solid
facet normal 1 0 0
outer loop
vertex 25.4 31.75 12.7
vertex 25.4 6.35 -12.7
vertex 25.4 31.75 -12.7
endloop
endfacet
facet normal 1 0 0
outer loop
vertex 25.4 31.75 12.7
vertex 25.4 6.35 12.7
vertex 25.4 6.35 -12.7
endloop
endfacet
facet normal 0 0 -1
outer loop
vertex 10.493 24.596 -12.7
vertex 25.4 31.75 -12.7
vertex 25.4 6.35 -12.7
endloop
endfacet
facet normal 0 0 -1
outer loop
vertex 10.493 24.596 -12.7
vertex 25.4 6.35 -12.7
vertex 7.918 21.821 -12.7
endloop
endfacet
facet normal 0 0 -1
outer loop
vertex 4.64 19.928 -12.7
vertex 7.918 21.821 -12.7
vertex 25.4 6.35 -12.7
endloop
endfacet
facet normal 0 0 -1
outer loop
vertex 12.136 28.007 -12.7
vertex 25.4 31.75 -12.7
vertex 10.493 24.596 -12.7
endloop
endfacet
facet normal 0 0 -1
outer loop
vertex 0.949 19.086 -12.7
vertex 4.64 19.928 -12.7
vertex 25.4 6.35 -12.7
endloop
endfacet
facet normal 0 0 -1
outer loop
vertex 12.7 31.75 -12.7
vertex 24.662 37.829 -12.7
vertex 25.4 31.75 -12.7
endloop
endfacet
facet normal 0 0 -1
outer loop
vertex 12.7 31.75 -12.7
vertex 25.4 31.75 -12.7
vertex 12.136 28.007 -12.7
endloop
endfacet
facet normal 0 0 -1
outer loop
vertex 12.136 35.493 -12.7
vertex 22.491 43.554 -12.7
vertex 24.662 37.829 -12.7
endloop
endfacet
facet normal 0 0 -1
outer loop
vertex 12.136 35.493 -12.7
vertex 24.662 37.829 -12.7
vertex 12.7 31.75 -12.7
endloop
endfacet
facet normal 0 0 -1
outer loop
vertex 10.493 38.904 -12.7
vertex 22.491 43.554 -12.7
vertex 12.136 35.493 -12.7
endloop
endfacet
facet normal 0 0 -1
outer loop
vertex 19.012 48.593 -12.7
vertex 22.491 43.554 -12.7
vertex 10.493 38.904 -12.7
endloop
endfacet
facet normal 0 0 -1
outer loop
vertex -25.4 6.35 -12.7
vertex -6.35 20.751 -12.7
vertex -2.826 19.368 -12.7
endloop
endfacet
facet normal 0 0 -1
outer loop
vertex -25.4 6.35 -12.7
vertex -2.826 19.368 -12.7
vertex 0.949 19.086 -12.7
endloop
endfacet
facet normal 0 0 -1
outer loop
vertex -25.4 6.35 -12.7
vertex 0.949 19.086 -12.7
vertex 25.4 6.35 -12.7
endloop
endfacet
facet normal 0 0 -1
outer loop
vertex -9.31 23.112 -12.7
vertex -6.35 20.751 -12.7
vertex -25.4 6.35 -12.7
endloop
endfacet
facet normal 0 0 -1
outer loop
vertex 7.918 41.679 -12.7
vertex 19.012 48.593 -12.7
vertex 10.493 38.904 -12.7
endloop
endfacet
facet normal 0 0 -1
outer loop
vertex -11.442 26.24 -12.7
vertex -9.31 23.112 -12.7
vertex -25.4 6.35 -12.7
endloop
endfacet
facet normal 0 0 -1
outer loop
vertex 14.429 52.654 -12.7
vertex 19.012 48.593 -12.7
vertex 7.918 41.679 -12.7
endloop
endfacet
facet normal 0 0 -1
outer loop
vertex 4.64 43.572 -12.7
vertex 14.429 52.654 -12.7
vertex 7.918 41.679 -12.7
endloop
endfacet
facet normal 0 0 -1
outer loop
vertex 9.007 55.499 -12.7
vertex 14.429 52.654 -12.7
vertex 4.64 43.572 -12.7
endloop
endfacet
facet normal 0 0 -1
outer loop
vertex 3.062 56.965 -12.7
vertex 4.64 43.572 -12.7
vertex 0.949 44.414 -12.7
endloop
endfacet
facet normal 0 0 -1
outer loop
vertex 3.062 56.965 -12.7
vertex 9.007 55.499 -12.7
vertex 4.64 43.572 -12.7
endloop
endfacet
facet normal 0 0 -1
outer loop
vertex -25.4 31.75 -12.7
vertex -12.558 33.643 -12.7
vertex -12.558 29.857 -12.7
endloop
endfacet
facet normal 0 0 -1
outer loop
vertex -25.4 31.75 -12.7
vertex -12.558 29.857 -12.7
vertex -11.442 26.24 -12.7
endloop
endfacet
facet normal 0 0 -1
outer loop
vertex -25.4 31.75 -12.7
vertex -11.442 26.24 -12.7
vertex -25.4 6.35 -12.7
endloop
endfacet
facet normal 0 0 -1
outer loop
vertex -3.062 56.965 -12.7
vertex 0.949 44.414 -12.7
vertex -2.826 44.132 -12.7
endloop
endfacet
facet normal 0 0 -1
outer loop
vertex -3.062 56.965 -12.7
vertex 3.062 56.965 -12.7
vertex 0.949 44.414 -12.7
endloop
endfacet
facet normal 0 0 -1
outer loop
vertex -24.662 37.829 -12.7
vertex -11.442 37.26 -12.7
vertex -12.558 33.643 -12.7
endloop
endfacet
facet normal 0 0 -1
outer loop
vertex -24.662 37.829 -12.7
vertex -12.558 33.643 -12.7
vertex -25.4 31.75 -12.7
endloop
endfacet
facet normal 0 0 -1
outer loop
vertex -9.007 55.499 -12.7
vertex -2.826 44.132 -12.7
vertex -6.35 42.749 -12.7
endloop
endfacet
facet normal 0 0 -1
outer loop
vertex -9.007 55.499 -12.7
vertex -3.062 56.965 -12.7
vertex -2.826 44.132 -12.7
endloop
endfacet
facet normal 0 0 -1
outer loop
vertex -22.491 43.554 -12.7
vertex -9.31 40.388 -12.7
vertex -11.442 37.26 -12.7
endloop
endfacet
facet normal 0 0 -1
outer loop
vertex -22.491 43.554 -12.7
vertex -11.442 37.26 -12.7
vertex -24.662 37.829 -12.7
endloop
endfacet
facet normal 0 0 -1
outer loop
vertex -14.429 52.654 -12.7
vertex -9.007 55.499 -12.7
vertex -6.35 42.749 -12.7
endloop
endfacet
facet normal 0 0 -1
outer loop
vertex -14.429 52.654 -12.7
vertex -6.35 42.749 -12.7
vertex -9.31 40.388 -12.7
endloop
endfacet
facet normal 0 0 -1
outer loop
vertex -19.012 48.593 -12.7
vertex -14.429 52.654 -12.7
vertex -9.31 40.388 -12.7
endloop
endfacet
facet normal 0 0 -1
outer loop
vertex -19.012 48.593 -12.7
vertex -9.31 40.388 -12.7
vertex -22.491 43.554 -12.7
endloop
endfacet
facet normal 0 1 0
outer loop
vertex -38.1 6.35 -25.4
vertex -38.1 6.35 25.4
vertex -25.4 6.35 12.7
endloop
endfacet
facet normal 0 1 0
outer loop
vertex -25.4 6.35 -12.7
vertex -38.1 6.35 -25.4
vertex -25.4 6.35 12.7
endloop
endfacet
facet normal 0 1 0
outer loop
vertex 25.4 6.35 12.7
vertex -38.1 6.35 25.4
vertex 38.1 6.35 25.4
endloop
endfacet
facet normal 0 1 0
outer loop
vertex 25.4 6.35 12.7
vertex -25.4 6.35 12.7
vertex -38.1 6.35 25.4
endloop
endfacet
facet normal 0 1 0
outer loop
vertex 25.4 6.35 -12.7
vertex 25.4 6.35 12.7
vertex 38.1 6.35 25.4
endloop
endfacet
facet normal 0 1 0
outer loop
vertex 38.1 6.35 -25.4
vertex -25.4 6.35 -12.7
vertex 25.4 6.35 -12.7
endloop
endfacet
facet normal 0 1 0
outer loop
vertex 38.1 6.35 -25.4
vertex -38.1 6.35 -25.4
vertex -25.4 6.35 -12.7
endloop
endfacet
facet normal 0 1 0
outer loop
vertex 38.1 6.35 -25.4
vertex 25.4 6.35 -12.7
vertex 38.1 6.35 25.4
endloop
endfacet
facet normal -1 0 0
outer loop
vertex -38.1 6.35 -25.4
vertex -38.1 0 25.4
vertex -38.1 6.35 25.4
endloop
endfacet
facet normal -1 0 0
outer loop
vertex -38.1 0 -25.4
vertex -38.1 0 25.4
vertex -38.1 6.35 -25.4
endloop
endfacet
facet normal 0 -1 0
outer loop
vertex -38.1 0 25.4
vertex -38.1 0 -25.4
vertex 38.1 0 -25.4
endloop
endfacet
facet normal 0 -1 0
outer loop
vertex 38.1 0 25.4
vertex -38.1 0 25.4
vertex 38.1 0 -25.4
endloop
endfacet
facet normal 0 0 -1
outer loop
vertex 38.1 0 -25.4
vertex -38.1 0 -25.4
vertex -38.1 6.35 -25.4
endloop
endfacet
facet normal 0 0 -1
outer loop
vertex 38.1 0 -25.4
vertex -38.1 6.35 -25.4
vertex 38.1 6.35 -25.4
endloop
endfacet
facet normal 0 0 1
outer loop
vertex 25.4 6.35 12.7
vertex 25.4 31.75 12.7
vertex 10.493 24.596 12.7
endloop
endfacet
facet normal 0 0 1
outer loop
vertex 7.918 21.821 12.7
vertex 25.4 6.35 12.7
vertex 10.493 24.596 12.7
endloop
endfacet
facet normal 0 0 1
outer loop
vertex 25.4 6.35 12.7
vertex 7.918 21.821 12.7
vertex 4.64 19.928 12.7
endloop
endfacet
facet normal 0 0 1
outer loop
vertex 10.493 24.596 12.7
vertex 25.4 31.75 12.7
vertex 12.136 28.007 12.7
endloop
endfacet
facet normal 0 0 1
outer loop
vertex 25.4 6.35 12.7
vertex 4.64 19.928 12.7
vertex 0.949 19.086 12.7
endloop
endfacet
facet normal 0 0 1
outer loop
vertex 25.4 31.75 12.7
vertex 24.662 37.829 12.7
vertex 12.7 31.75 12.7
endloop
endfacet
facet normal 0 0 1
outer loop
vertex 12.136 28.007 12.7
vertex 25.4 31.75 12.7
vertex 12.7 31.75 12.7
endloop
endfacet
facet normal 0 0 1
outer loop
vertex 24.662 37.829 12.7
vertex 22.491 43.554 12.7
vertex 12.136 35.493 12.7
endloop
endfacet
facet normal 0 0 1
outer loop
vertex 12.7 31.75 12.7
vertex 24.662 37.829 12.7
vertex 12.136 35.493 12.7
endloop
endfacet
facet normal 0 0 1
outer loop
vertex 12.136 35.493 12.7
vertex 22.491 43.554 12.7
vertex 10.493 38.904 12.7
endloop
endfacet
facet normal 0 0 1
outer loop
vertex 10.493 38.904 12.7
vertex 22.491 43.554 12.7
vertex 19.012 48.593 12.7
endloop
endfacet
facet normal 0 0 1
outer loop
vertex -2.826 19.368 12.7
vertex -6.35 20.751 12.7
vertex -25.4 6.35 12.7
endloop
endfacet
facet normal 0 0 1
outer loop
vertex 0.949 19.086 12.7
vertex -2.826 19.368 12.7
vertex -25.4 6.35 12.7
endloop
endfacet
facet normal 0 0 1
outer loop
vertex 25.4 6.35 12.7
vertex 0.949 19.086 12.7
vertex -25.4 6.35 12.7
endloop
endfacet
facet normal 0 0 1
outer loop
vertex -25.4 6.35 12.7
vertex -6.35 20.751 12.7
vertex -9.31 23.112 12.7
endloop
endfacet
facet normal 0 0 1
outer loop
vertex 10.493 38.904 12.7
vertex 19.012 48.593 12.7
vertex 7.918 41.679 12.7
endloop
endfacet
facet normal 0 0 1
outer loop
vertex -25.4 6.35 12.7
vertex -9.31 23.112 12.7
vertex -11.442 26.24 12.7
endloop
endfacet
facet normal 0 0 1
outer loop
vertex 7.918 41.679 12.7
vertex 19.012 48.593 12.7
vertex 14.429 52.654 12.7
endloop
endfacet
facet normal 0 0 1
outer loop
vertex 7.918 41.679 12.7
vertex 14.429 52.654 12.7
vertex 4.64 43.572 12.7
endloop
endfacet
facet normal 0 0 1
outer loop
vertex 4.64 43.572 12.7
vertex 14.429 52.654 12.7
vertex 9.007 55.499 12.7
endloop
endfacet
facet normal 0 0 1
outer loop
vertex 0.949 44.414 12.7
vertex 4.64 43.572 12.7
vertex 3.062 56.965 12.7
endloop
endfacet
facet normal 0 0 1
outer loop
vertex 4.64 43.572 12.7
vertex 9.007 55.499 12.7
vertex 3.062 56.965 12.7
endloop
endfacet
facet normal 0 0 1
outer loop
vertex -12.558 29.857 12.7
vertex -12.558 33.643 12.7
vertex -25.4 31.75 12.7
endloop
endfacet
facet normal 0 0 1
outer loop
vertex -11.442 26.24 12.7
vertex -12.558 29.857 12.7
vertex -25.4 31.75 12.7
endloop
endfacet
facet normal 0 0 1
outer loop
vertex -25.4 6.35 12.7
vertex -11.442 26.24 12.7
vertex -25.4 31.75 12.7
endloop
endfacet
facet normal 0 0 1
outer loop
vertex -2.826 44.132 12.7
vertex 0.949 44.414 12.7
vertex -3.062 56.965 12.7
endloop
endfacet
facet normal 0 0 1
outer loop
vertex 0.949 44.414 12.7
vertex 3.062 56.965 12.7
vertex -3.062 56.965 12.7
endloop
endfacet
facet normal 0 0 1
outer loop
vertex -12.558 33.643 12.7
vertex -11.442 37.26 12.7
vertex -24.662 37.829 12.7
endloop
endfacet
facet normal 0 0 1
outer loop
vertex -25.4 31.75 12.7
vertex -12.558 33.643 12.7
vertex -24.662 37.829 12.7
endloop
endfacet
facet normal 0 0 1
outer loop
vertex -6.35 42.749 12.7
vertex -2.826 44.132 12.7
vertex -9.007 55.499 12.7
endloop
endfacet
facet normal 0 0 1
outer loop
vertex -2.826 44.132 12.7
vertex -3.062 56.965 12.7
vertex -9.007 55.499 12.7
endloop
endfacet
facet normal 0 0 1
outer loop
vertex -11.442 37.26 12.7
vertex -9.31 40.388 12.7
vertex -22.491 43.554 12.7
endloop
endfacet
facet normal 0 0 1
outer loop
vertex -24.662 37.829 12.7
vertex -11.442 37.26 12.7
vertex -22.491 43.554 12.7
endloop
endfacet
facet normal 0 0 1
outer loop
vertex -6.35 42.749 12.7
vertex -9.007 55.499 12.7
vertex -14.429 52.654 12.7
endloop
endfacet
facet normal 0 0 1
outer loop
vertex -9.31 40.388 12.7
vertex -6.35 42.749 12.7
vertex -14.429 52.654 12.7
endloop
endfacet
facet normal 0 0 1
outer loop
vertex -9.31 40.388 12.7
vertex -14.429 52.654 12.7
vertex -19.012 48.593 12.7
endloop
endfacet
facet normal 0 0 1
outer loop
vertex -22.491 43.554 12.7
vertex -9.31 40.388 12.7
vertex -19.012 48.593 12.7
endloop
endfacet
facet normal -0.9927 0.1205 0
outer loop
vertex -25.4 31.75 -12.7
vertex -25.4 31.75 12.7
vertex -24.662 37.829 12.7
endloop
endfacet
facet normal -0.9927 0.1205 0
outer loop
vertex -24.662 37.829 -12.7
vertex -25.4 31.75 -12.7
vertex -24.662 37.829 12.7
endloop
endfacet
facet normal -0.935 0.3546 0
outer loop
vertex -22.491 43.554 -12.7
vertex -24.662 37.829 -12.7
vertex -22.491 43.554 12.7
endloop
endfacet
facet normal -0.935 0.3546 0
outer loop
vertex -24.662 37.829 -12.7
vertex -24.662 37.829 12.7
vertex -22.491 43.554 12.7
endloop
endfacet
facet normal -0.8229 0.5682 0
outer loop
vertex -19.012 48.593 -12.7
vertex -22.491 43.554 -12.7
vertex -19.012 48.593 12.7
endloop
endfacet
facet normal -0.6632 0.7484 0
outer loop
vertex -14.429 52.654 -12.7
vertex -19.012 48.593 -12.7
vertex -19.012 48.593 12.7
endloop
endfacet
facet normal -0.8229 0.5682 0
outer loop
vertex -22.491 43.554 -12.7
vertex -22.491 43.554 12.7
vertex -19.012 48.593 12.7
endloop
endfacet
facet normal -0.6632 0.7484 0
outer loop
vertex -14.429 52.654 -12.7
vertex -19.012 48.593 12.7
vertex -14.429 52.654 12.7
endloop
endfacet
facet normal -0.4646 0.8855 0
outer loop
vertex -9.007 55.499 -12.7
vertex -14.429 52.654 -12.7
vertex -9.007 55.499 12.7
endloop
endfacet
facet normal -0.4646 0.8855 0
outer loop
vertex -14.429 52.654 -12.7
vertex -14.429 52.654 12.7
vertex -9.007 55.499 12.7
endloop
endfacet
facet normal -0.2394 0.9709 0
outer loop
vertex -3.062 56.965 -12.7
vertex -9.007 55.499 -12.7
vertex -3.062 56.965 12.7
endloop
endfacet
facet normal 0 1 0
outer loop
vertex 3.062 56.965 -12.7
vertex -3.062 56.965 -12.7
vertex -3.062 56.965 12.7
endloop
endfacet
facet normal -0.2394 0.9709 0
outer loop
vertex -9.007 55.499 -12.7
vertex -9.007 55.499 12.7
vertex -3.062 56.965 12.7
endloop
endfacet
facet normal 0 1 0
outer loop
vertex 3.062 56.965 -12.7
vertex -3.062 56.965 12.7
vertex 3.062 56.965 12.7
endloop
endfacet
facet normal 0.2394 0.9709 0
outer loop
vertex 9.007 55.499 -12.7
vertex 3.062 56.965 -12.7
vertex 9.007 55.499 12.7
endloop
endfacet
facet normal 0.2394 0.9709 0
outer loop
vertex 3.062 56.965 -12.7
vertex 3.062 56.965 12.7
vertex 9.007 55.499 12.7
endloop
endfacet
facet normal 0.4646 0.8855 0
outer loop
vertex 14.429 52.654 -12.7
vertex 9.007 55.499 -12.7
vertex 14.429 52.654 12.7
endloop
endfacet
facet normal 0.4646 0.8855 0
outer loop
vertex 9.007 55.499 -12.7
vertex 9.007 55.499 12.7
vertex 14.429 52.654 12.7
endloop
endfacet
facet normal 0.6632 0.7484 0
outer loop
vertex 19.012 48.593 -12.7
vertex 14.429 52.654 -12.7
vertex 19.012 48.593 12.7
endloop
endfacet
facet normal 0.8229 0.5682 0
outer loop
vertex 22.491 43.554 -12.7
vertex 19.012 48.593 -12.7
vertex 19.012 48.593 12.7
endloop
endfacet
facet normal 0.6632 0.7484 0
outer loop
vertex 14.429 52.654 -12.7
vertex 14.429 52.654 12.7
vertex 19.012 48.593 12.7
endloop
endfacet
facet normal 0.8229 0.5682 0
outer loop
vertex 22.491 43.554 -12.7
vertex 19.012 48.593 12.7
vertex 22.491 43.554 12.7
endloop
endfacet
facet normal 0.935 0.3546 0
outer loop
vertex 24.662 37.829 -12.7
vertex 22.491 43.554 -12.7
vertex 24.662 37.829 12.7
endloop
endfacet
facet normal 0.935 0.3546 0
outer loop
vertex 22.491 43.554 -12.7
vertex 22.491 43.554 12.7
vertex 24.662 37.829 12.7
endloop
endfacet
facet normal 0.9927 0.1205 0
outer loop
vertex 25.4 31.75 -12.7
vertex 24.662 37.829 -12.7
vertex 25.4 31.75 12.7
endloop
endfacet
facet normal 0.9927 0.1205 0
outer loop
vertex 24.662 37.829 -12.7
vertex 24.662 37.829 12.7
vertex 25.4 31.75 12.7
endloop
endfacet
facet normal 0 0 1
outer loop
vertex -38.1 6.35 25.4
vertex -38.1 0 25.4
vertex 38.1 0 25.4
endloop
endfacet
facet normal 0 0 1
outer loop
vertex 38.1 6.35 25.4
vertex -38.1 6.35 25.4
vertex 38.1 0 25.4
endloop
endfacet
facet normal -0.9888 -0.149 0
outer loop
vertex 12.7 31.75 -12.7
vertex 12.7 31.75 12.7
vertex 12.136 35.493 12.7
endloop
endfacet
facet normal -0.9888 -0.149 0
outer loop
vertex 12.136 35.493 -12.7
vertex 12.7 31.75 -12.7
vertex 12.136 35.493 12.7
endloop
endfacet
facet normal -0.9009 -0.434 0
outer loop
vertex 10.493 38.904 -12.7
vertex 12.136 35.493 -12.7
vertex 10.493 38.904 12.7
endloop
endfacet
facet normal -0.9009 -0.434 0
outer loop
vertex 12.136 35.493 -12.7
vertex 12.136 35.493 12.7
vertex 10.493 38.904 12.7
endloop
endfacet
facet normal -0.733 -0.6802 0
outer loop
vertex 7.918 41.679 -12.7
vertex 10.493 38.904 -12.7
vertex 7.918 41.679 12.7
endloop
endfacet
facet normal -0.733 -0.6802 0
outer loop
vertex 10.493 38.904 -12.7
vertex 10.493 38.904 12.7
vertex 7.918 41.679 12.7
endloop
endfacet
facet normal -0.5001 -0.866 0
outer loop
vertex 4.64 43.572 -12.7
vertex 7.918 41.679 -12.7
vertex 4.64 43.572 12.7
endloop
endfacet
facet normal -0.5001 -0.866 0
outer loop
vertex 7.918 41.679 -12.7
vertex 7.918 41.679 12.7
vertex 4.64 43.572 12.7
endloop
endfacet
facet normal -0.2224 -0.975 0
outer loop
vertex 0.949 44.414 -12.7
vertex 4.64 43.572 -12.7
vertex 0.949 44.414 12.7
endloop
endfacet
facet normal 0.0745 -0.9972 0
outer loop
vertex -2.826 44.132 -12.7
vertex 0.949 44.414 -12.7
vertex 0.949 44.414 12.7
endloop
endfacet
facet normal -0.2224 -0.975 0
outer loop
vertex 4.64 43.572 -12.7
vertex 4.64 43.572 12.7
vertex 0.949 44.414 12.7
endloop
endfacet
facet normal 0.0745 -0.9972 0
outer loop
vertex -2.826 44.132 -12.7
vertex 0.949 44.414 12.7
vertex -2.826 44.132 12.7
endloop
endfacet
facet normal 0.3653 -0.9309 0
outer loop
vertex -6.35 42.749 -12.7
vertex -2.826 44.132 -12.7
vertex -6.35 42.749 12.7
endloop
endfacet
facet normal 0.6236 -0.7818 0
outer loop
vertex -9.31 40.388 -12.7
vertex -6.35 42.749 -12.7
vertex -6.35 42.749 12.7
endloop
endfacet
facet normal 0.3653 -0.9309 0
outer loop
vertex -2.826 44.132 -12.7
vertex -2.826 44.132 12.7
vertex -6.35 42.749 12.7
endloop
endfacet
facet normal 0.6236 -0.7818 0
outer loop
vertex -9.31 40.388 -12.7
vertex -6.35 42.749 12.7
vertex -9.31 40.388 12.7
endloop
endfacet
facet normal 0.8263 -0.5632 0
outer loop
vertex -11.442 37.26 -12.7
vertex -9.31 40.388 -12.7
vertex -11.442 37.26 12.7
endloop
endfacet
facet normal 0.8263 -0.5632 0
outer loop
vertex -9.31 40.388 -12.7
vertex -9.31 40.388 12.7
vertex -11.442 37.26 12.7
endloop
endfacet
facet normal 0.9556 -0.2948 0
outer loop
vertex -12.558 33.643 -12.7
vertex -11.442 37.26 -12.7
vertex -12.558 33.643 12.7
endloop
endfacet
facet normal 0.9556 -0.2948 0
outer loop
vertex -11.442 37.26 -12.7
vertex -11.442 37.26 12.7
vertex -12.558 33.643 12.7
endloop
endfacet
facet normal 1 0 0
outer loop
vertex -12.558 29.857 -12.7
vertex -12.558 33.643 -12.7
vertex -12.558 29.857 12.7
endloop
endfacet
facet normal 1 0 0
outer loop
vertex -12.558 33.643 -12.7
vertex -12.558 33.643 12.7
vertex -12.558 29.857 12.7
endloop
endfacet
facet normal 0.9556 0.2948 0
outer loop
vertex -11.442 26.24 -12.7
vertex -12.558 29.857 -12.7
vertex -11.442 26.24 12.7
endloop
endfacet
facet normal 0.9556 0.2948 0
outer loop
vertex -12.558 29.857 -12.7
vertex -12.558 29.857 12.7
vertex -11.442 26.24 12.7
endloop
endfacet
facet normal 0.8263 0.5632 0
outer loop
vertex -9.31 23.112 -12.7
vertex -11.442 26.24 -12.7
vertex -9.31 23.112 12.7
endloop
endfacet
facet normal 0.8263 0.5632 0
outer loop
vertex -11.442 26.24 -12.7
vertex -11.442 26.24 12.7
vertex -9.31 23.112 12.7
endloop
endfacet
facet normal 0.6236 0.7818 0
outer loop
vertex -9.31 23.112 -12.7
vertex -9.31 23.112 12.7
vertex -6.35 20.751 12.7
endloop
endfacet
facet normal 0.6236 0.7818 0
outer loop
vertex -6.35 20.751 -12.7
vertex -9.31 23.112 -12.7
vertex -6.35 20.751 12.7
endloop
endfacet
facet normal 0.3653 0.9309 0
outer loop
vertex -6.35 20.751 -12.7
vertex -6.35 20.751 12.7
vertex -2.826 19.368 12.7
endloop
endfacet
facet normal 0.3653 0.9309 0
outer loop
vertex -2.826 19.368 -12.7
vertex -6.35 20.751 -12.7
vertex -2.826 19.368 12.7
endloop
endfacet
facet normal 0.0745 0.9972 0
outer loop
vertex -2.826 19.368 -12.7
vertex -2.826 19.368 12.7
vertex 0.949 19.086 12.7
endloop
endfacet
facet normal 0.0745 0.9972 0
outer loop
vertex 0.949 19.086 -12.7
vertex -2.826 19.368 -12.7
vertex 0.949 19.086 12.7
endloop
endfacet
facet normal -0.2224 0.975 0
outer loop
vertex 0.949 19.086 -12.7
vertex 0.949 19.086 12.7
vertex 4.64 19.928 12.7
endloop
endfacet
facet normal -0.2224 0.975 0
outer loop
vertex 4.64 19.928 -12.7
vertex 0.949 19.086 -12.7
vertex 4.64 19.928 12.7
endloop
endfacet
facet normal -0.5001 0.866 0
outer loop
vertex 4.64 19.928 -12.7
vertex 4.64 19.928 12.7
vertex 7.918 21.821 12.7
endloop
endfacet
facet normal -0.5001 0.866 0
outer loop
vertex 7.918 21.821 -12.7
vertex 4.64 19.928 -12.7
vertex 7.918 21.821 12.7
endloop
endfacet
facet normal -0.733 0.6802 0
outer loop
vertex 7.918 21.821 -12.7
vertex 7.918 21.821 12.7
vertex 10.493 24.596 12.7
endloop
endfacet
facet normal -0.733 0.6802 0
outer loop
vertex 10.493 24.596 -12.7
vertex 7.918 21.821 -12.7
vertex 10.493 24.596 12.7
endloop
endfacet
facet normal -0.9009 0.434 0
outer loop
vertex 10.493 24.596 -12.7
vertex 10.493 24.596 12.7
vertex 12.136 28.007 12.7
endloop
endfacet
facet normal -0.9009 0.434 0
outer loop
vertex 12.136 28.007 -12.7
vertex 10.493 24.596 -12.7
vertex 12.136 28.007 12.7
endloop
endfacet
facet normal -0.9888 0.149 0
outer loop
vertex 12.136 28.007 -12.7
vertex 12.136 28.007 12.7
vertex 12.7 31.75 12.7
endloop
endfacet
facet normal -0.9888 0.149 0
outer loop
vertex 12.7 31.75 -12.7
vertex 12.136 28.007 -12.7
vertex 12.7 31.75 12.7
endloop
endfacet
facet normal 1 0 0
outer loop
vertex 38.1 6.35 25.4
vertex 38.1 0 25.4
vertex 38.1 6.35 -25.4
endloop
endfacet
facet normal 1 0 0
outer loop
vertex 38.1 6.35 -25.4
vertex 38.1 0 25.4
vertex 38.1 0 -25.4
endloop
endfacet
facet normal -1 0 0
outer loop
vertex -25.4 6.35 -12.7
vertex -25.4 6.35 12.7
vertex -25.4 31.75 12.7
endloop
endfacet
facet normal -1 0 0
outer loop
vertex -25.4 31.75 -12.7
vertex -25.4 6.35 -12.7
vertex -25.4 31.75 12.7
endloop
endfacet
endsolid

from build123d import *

# Parameters (mm, degrees)
SKETCH1_W           = 76.2
SKETCH1_H           = 50.8
BOSS_EXTRUDE1_DEPTH = 6.35
SKETCH2_W           = 50.8
SKETCH2_H           = 25.4
BOSS_EXTRUDE2_DEPTH = 12.7
SKETCH3_R           = 12.7
CUT_EXTRUDE1_DEPTH  = 79.545162168


with BuildPart() as part:
    # Sketch1 → Boss-Extrude1 (new body)
    with BuildSketch(Plane(origin=(0, 0, 0), x_dir=(1, 0, 0), z_dir=(0, 1, 0))):
        Rectangle(SKETCH1_W, SKETCH1_H)
    extrude(amount=BOSS_EXTRUDE1_DEPTH)

    # Sketch2 → Boss-Extrude2 (add, symmetric)
    with BuildSketch(Plane.XY):
        with BuildLine():
            ThreePointArc((-25.4, 31.75), (0, 57.15), (25.4, 31.75))
            Line((25.4, 31.75), (-25.4, 31.75))
        make_face()
        with Locations((0, 19.05)):
            Rectangle(SKETCH2_W, SKETCH2_H)
    extrude(amount=BOSS_EXTRUDE2_DEPTH, both=True)

    # Sketch3 → Cut-Extrude1 (cut, through all)
    with BuildSketch(Plane.XY.offset(12.7)):
        with Locations((0, 31.75)):
            Circle(SKETCH3_R)
    extrude(amount=-CUT_EXTRUDE1_DEPTH, mode=Mode.SUBTRACT)


solid = part.part
